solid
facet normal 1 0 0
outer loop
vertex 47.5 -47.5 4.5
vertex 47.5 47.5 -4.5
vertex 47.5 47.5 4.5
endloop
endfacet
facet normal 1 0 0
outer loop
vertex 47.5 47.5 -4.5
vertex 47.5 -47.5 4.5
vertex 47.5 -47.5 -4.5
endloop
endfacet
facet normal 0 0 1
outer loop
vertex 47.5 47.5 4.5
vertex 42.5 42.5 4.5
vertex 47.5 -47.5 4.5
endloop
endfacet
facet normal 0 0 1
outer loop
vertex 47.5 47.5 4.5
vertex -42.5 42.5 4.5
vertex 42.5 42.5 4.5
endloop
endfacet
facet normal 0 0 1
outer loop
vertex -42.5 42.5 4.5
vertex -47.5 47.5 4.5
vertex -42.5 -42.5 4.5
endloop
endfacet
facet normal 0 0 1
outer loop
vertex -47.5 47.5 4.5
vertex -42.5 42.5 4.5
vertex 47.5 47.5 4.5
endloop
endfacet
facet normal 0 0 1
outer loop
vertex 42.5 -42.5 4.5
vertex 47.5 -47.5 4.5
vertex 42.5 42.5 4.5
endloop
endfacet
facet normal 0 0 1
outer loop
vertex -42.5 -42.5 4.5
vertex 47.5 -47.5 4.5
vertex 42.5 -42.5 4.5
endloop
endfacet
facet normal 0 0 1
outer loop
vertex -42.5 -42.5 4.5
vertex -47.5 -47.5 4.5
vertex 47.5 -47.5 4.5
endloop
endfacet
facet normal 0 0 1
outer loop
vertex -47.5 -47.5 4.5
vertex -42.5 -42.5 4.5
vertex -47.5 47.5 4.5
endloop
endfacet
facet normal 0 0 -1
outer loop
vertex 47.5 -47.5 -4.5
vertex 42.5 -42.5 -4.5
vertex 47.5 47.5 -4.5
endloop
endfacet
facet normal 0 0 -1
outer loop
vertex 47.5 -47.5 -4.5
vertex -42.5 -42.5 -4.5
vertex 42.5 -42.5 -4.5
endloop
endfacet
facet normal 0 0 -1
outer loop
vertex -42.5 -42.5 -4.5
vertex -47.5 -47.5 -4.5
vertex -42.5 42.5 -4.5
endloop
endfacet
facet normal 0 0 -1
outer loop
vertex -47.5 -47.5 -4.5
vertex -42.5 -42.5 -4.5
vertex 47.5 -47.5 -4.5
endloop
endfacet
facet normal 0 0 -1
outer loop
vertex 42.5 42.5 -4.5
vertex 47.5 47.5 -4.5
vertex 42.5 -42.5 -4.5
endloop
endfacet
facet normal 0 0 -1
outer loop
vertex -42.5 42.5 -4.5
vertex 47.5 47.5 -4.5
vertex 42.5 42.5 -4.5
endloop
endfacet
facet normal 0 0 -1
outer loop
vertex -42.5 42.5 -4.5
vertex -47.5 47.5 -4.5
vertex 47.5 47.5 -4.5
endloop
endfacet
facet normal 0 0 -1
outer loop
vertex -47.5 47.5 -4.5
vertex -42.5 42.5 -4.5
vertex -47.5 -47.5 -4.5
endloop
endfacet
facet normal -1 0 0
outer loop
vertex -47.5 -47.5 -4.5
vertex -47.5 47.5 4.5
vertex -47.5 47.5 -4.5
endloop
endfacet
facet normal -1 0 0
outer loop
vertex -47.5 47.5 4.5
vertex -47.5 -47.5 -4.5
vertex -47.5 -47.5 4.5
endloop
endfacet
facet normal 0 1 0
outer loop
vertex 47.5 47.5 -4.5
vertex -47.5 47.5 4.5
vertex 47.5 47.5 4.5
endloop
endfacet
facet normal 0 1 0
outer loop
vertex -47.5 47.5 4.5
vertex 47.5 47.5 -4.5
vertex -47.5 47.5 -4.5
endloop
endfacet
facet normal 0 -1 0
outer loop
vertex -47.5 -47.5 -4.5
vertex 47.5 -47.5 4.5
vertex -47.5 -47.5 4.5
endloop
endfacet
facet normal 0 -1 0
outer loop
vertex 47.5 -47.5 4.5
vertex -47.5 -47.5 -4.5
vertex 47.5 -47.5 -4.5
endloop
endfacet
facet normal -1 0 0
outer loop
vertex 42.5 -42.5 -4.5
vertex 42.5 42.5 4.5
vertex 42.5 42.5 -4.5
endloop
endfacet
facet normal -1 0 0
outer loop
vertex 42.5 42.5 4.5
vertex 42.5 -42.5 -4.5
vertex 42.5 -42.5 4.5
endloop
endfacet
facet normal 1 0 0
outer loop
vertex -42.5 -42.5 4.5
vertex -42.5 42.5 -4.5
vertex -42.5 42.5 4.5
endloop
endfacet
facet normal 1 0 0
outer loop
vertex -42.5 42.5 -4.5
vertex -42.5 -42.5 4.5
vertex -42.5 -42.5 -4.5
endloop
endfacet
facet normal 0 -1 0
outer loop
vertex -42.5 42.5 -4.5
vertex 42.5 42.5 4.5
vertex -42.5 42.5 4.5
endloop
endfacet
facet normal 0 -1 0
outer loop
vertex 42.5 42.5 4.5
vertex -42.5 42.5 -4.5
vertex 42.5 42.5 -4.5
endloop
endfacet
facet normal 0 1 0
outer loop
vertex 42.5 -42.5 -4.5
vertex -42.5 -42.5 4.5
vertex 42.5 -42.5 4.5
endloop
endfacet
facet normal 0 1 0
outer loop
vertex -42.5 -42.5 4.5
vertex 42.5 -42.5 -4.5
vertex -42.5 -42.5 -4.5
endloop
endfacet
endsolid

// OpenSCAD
module frame_panel() {
    difference() {
        cube([95, 95, 9], center=true);
        translate([-42.5, -42.5, -4.5])
            cube([85, 85, 9], center=false);
    }
}

frame_panel();
